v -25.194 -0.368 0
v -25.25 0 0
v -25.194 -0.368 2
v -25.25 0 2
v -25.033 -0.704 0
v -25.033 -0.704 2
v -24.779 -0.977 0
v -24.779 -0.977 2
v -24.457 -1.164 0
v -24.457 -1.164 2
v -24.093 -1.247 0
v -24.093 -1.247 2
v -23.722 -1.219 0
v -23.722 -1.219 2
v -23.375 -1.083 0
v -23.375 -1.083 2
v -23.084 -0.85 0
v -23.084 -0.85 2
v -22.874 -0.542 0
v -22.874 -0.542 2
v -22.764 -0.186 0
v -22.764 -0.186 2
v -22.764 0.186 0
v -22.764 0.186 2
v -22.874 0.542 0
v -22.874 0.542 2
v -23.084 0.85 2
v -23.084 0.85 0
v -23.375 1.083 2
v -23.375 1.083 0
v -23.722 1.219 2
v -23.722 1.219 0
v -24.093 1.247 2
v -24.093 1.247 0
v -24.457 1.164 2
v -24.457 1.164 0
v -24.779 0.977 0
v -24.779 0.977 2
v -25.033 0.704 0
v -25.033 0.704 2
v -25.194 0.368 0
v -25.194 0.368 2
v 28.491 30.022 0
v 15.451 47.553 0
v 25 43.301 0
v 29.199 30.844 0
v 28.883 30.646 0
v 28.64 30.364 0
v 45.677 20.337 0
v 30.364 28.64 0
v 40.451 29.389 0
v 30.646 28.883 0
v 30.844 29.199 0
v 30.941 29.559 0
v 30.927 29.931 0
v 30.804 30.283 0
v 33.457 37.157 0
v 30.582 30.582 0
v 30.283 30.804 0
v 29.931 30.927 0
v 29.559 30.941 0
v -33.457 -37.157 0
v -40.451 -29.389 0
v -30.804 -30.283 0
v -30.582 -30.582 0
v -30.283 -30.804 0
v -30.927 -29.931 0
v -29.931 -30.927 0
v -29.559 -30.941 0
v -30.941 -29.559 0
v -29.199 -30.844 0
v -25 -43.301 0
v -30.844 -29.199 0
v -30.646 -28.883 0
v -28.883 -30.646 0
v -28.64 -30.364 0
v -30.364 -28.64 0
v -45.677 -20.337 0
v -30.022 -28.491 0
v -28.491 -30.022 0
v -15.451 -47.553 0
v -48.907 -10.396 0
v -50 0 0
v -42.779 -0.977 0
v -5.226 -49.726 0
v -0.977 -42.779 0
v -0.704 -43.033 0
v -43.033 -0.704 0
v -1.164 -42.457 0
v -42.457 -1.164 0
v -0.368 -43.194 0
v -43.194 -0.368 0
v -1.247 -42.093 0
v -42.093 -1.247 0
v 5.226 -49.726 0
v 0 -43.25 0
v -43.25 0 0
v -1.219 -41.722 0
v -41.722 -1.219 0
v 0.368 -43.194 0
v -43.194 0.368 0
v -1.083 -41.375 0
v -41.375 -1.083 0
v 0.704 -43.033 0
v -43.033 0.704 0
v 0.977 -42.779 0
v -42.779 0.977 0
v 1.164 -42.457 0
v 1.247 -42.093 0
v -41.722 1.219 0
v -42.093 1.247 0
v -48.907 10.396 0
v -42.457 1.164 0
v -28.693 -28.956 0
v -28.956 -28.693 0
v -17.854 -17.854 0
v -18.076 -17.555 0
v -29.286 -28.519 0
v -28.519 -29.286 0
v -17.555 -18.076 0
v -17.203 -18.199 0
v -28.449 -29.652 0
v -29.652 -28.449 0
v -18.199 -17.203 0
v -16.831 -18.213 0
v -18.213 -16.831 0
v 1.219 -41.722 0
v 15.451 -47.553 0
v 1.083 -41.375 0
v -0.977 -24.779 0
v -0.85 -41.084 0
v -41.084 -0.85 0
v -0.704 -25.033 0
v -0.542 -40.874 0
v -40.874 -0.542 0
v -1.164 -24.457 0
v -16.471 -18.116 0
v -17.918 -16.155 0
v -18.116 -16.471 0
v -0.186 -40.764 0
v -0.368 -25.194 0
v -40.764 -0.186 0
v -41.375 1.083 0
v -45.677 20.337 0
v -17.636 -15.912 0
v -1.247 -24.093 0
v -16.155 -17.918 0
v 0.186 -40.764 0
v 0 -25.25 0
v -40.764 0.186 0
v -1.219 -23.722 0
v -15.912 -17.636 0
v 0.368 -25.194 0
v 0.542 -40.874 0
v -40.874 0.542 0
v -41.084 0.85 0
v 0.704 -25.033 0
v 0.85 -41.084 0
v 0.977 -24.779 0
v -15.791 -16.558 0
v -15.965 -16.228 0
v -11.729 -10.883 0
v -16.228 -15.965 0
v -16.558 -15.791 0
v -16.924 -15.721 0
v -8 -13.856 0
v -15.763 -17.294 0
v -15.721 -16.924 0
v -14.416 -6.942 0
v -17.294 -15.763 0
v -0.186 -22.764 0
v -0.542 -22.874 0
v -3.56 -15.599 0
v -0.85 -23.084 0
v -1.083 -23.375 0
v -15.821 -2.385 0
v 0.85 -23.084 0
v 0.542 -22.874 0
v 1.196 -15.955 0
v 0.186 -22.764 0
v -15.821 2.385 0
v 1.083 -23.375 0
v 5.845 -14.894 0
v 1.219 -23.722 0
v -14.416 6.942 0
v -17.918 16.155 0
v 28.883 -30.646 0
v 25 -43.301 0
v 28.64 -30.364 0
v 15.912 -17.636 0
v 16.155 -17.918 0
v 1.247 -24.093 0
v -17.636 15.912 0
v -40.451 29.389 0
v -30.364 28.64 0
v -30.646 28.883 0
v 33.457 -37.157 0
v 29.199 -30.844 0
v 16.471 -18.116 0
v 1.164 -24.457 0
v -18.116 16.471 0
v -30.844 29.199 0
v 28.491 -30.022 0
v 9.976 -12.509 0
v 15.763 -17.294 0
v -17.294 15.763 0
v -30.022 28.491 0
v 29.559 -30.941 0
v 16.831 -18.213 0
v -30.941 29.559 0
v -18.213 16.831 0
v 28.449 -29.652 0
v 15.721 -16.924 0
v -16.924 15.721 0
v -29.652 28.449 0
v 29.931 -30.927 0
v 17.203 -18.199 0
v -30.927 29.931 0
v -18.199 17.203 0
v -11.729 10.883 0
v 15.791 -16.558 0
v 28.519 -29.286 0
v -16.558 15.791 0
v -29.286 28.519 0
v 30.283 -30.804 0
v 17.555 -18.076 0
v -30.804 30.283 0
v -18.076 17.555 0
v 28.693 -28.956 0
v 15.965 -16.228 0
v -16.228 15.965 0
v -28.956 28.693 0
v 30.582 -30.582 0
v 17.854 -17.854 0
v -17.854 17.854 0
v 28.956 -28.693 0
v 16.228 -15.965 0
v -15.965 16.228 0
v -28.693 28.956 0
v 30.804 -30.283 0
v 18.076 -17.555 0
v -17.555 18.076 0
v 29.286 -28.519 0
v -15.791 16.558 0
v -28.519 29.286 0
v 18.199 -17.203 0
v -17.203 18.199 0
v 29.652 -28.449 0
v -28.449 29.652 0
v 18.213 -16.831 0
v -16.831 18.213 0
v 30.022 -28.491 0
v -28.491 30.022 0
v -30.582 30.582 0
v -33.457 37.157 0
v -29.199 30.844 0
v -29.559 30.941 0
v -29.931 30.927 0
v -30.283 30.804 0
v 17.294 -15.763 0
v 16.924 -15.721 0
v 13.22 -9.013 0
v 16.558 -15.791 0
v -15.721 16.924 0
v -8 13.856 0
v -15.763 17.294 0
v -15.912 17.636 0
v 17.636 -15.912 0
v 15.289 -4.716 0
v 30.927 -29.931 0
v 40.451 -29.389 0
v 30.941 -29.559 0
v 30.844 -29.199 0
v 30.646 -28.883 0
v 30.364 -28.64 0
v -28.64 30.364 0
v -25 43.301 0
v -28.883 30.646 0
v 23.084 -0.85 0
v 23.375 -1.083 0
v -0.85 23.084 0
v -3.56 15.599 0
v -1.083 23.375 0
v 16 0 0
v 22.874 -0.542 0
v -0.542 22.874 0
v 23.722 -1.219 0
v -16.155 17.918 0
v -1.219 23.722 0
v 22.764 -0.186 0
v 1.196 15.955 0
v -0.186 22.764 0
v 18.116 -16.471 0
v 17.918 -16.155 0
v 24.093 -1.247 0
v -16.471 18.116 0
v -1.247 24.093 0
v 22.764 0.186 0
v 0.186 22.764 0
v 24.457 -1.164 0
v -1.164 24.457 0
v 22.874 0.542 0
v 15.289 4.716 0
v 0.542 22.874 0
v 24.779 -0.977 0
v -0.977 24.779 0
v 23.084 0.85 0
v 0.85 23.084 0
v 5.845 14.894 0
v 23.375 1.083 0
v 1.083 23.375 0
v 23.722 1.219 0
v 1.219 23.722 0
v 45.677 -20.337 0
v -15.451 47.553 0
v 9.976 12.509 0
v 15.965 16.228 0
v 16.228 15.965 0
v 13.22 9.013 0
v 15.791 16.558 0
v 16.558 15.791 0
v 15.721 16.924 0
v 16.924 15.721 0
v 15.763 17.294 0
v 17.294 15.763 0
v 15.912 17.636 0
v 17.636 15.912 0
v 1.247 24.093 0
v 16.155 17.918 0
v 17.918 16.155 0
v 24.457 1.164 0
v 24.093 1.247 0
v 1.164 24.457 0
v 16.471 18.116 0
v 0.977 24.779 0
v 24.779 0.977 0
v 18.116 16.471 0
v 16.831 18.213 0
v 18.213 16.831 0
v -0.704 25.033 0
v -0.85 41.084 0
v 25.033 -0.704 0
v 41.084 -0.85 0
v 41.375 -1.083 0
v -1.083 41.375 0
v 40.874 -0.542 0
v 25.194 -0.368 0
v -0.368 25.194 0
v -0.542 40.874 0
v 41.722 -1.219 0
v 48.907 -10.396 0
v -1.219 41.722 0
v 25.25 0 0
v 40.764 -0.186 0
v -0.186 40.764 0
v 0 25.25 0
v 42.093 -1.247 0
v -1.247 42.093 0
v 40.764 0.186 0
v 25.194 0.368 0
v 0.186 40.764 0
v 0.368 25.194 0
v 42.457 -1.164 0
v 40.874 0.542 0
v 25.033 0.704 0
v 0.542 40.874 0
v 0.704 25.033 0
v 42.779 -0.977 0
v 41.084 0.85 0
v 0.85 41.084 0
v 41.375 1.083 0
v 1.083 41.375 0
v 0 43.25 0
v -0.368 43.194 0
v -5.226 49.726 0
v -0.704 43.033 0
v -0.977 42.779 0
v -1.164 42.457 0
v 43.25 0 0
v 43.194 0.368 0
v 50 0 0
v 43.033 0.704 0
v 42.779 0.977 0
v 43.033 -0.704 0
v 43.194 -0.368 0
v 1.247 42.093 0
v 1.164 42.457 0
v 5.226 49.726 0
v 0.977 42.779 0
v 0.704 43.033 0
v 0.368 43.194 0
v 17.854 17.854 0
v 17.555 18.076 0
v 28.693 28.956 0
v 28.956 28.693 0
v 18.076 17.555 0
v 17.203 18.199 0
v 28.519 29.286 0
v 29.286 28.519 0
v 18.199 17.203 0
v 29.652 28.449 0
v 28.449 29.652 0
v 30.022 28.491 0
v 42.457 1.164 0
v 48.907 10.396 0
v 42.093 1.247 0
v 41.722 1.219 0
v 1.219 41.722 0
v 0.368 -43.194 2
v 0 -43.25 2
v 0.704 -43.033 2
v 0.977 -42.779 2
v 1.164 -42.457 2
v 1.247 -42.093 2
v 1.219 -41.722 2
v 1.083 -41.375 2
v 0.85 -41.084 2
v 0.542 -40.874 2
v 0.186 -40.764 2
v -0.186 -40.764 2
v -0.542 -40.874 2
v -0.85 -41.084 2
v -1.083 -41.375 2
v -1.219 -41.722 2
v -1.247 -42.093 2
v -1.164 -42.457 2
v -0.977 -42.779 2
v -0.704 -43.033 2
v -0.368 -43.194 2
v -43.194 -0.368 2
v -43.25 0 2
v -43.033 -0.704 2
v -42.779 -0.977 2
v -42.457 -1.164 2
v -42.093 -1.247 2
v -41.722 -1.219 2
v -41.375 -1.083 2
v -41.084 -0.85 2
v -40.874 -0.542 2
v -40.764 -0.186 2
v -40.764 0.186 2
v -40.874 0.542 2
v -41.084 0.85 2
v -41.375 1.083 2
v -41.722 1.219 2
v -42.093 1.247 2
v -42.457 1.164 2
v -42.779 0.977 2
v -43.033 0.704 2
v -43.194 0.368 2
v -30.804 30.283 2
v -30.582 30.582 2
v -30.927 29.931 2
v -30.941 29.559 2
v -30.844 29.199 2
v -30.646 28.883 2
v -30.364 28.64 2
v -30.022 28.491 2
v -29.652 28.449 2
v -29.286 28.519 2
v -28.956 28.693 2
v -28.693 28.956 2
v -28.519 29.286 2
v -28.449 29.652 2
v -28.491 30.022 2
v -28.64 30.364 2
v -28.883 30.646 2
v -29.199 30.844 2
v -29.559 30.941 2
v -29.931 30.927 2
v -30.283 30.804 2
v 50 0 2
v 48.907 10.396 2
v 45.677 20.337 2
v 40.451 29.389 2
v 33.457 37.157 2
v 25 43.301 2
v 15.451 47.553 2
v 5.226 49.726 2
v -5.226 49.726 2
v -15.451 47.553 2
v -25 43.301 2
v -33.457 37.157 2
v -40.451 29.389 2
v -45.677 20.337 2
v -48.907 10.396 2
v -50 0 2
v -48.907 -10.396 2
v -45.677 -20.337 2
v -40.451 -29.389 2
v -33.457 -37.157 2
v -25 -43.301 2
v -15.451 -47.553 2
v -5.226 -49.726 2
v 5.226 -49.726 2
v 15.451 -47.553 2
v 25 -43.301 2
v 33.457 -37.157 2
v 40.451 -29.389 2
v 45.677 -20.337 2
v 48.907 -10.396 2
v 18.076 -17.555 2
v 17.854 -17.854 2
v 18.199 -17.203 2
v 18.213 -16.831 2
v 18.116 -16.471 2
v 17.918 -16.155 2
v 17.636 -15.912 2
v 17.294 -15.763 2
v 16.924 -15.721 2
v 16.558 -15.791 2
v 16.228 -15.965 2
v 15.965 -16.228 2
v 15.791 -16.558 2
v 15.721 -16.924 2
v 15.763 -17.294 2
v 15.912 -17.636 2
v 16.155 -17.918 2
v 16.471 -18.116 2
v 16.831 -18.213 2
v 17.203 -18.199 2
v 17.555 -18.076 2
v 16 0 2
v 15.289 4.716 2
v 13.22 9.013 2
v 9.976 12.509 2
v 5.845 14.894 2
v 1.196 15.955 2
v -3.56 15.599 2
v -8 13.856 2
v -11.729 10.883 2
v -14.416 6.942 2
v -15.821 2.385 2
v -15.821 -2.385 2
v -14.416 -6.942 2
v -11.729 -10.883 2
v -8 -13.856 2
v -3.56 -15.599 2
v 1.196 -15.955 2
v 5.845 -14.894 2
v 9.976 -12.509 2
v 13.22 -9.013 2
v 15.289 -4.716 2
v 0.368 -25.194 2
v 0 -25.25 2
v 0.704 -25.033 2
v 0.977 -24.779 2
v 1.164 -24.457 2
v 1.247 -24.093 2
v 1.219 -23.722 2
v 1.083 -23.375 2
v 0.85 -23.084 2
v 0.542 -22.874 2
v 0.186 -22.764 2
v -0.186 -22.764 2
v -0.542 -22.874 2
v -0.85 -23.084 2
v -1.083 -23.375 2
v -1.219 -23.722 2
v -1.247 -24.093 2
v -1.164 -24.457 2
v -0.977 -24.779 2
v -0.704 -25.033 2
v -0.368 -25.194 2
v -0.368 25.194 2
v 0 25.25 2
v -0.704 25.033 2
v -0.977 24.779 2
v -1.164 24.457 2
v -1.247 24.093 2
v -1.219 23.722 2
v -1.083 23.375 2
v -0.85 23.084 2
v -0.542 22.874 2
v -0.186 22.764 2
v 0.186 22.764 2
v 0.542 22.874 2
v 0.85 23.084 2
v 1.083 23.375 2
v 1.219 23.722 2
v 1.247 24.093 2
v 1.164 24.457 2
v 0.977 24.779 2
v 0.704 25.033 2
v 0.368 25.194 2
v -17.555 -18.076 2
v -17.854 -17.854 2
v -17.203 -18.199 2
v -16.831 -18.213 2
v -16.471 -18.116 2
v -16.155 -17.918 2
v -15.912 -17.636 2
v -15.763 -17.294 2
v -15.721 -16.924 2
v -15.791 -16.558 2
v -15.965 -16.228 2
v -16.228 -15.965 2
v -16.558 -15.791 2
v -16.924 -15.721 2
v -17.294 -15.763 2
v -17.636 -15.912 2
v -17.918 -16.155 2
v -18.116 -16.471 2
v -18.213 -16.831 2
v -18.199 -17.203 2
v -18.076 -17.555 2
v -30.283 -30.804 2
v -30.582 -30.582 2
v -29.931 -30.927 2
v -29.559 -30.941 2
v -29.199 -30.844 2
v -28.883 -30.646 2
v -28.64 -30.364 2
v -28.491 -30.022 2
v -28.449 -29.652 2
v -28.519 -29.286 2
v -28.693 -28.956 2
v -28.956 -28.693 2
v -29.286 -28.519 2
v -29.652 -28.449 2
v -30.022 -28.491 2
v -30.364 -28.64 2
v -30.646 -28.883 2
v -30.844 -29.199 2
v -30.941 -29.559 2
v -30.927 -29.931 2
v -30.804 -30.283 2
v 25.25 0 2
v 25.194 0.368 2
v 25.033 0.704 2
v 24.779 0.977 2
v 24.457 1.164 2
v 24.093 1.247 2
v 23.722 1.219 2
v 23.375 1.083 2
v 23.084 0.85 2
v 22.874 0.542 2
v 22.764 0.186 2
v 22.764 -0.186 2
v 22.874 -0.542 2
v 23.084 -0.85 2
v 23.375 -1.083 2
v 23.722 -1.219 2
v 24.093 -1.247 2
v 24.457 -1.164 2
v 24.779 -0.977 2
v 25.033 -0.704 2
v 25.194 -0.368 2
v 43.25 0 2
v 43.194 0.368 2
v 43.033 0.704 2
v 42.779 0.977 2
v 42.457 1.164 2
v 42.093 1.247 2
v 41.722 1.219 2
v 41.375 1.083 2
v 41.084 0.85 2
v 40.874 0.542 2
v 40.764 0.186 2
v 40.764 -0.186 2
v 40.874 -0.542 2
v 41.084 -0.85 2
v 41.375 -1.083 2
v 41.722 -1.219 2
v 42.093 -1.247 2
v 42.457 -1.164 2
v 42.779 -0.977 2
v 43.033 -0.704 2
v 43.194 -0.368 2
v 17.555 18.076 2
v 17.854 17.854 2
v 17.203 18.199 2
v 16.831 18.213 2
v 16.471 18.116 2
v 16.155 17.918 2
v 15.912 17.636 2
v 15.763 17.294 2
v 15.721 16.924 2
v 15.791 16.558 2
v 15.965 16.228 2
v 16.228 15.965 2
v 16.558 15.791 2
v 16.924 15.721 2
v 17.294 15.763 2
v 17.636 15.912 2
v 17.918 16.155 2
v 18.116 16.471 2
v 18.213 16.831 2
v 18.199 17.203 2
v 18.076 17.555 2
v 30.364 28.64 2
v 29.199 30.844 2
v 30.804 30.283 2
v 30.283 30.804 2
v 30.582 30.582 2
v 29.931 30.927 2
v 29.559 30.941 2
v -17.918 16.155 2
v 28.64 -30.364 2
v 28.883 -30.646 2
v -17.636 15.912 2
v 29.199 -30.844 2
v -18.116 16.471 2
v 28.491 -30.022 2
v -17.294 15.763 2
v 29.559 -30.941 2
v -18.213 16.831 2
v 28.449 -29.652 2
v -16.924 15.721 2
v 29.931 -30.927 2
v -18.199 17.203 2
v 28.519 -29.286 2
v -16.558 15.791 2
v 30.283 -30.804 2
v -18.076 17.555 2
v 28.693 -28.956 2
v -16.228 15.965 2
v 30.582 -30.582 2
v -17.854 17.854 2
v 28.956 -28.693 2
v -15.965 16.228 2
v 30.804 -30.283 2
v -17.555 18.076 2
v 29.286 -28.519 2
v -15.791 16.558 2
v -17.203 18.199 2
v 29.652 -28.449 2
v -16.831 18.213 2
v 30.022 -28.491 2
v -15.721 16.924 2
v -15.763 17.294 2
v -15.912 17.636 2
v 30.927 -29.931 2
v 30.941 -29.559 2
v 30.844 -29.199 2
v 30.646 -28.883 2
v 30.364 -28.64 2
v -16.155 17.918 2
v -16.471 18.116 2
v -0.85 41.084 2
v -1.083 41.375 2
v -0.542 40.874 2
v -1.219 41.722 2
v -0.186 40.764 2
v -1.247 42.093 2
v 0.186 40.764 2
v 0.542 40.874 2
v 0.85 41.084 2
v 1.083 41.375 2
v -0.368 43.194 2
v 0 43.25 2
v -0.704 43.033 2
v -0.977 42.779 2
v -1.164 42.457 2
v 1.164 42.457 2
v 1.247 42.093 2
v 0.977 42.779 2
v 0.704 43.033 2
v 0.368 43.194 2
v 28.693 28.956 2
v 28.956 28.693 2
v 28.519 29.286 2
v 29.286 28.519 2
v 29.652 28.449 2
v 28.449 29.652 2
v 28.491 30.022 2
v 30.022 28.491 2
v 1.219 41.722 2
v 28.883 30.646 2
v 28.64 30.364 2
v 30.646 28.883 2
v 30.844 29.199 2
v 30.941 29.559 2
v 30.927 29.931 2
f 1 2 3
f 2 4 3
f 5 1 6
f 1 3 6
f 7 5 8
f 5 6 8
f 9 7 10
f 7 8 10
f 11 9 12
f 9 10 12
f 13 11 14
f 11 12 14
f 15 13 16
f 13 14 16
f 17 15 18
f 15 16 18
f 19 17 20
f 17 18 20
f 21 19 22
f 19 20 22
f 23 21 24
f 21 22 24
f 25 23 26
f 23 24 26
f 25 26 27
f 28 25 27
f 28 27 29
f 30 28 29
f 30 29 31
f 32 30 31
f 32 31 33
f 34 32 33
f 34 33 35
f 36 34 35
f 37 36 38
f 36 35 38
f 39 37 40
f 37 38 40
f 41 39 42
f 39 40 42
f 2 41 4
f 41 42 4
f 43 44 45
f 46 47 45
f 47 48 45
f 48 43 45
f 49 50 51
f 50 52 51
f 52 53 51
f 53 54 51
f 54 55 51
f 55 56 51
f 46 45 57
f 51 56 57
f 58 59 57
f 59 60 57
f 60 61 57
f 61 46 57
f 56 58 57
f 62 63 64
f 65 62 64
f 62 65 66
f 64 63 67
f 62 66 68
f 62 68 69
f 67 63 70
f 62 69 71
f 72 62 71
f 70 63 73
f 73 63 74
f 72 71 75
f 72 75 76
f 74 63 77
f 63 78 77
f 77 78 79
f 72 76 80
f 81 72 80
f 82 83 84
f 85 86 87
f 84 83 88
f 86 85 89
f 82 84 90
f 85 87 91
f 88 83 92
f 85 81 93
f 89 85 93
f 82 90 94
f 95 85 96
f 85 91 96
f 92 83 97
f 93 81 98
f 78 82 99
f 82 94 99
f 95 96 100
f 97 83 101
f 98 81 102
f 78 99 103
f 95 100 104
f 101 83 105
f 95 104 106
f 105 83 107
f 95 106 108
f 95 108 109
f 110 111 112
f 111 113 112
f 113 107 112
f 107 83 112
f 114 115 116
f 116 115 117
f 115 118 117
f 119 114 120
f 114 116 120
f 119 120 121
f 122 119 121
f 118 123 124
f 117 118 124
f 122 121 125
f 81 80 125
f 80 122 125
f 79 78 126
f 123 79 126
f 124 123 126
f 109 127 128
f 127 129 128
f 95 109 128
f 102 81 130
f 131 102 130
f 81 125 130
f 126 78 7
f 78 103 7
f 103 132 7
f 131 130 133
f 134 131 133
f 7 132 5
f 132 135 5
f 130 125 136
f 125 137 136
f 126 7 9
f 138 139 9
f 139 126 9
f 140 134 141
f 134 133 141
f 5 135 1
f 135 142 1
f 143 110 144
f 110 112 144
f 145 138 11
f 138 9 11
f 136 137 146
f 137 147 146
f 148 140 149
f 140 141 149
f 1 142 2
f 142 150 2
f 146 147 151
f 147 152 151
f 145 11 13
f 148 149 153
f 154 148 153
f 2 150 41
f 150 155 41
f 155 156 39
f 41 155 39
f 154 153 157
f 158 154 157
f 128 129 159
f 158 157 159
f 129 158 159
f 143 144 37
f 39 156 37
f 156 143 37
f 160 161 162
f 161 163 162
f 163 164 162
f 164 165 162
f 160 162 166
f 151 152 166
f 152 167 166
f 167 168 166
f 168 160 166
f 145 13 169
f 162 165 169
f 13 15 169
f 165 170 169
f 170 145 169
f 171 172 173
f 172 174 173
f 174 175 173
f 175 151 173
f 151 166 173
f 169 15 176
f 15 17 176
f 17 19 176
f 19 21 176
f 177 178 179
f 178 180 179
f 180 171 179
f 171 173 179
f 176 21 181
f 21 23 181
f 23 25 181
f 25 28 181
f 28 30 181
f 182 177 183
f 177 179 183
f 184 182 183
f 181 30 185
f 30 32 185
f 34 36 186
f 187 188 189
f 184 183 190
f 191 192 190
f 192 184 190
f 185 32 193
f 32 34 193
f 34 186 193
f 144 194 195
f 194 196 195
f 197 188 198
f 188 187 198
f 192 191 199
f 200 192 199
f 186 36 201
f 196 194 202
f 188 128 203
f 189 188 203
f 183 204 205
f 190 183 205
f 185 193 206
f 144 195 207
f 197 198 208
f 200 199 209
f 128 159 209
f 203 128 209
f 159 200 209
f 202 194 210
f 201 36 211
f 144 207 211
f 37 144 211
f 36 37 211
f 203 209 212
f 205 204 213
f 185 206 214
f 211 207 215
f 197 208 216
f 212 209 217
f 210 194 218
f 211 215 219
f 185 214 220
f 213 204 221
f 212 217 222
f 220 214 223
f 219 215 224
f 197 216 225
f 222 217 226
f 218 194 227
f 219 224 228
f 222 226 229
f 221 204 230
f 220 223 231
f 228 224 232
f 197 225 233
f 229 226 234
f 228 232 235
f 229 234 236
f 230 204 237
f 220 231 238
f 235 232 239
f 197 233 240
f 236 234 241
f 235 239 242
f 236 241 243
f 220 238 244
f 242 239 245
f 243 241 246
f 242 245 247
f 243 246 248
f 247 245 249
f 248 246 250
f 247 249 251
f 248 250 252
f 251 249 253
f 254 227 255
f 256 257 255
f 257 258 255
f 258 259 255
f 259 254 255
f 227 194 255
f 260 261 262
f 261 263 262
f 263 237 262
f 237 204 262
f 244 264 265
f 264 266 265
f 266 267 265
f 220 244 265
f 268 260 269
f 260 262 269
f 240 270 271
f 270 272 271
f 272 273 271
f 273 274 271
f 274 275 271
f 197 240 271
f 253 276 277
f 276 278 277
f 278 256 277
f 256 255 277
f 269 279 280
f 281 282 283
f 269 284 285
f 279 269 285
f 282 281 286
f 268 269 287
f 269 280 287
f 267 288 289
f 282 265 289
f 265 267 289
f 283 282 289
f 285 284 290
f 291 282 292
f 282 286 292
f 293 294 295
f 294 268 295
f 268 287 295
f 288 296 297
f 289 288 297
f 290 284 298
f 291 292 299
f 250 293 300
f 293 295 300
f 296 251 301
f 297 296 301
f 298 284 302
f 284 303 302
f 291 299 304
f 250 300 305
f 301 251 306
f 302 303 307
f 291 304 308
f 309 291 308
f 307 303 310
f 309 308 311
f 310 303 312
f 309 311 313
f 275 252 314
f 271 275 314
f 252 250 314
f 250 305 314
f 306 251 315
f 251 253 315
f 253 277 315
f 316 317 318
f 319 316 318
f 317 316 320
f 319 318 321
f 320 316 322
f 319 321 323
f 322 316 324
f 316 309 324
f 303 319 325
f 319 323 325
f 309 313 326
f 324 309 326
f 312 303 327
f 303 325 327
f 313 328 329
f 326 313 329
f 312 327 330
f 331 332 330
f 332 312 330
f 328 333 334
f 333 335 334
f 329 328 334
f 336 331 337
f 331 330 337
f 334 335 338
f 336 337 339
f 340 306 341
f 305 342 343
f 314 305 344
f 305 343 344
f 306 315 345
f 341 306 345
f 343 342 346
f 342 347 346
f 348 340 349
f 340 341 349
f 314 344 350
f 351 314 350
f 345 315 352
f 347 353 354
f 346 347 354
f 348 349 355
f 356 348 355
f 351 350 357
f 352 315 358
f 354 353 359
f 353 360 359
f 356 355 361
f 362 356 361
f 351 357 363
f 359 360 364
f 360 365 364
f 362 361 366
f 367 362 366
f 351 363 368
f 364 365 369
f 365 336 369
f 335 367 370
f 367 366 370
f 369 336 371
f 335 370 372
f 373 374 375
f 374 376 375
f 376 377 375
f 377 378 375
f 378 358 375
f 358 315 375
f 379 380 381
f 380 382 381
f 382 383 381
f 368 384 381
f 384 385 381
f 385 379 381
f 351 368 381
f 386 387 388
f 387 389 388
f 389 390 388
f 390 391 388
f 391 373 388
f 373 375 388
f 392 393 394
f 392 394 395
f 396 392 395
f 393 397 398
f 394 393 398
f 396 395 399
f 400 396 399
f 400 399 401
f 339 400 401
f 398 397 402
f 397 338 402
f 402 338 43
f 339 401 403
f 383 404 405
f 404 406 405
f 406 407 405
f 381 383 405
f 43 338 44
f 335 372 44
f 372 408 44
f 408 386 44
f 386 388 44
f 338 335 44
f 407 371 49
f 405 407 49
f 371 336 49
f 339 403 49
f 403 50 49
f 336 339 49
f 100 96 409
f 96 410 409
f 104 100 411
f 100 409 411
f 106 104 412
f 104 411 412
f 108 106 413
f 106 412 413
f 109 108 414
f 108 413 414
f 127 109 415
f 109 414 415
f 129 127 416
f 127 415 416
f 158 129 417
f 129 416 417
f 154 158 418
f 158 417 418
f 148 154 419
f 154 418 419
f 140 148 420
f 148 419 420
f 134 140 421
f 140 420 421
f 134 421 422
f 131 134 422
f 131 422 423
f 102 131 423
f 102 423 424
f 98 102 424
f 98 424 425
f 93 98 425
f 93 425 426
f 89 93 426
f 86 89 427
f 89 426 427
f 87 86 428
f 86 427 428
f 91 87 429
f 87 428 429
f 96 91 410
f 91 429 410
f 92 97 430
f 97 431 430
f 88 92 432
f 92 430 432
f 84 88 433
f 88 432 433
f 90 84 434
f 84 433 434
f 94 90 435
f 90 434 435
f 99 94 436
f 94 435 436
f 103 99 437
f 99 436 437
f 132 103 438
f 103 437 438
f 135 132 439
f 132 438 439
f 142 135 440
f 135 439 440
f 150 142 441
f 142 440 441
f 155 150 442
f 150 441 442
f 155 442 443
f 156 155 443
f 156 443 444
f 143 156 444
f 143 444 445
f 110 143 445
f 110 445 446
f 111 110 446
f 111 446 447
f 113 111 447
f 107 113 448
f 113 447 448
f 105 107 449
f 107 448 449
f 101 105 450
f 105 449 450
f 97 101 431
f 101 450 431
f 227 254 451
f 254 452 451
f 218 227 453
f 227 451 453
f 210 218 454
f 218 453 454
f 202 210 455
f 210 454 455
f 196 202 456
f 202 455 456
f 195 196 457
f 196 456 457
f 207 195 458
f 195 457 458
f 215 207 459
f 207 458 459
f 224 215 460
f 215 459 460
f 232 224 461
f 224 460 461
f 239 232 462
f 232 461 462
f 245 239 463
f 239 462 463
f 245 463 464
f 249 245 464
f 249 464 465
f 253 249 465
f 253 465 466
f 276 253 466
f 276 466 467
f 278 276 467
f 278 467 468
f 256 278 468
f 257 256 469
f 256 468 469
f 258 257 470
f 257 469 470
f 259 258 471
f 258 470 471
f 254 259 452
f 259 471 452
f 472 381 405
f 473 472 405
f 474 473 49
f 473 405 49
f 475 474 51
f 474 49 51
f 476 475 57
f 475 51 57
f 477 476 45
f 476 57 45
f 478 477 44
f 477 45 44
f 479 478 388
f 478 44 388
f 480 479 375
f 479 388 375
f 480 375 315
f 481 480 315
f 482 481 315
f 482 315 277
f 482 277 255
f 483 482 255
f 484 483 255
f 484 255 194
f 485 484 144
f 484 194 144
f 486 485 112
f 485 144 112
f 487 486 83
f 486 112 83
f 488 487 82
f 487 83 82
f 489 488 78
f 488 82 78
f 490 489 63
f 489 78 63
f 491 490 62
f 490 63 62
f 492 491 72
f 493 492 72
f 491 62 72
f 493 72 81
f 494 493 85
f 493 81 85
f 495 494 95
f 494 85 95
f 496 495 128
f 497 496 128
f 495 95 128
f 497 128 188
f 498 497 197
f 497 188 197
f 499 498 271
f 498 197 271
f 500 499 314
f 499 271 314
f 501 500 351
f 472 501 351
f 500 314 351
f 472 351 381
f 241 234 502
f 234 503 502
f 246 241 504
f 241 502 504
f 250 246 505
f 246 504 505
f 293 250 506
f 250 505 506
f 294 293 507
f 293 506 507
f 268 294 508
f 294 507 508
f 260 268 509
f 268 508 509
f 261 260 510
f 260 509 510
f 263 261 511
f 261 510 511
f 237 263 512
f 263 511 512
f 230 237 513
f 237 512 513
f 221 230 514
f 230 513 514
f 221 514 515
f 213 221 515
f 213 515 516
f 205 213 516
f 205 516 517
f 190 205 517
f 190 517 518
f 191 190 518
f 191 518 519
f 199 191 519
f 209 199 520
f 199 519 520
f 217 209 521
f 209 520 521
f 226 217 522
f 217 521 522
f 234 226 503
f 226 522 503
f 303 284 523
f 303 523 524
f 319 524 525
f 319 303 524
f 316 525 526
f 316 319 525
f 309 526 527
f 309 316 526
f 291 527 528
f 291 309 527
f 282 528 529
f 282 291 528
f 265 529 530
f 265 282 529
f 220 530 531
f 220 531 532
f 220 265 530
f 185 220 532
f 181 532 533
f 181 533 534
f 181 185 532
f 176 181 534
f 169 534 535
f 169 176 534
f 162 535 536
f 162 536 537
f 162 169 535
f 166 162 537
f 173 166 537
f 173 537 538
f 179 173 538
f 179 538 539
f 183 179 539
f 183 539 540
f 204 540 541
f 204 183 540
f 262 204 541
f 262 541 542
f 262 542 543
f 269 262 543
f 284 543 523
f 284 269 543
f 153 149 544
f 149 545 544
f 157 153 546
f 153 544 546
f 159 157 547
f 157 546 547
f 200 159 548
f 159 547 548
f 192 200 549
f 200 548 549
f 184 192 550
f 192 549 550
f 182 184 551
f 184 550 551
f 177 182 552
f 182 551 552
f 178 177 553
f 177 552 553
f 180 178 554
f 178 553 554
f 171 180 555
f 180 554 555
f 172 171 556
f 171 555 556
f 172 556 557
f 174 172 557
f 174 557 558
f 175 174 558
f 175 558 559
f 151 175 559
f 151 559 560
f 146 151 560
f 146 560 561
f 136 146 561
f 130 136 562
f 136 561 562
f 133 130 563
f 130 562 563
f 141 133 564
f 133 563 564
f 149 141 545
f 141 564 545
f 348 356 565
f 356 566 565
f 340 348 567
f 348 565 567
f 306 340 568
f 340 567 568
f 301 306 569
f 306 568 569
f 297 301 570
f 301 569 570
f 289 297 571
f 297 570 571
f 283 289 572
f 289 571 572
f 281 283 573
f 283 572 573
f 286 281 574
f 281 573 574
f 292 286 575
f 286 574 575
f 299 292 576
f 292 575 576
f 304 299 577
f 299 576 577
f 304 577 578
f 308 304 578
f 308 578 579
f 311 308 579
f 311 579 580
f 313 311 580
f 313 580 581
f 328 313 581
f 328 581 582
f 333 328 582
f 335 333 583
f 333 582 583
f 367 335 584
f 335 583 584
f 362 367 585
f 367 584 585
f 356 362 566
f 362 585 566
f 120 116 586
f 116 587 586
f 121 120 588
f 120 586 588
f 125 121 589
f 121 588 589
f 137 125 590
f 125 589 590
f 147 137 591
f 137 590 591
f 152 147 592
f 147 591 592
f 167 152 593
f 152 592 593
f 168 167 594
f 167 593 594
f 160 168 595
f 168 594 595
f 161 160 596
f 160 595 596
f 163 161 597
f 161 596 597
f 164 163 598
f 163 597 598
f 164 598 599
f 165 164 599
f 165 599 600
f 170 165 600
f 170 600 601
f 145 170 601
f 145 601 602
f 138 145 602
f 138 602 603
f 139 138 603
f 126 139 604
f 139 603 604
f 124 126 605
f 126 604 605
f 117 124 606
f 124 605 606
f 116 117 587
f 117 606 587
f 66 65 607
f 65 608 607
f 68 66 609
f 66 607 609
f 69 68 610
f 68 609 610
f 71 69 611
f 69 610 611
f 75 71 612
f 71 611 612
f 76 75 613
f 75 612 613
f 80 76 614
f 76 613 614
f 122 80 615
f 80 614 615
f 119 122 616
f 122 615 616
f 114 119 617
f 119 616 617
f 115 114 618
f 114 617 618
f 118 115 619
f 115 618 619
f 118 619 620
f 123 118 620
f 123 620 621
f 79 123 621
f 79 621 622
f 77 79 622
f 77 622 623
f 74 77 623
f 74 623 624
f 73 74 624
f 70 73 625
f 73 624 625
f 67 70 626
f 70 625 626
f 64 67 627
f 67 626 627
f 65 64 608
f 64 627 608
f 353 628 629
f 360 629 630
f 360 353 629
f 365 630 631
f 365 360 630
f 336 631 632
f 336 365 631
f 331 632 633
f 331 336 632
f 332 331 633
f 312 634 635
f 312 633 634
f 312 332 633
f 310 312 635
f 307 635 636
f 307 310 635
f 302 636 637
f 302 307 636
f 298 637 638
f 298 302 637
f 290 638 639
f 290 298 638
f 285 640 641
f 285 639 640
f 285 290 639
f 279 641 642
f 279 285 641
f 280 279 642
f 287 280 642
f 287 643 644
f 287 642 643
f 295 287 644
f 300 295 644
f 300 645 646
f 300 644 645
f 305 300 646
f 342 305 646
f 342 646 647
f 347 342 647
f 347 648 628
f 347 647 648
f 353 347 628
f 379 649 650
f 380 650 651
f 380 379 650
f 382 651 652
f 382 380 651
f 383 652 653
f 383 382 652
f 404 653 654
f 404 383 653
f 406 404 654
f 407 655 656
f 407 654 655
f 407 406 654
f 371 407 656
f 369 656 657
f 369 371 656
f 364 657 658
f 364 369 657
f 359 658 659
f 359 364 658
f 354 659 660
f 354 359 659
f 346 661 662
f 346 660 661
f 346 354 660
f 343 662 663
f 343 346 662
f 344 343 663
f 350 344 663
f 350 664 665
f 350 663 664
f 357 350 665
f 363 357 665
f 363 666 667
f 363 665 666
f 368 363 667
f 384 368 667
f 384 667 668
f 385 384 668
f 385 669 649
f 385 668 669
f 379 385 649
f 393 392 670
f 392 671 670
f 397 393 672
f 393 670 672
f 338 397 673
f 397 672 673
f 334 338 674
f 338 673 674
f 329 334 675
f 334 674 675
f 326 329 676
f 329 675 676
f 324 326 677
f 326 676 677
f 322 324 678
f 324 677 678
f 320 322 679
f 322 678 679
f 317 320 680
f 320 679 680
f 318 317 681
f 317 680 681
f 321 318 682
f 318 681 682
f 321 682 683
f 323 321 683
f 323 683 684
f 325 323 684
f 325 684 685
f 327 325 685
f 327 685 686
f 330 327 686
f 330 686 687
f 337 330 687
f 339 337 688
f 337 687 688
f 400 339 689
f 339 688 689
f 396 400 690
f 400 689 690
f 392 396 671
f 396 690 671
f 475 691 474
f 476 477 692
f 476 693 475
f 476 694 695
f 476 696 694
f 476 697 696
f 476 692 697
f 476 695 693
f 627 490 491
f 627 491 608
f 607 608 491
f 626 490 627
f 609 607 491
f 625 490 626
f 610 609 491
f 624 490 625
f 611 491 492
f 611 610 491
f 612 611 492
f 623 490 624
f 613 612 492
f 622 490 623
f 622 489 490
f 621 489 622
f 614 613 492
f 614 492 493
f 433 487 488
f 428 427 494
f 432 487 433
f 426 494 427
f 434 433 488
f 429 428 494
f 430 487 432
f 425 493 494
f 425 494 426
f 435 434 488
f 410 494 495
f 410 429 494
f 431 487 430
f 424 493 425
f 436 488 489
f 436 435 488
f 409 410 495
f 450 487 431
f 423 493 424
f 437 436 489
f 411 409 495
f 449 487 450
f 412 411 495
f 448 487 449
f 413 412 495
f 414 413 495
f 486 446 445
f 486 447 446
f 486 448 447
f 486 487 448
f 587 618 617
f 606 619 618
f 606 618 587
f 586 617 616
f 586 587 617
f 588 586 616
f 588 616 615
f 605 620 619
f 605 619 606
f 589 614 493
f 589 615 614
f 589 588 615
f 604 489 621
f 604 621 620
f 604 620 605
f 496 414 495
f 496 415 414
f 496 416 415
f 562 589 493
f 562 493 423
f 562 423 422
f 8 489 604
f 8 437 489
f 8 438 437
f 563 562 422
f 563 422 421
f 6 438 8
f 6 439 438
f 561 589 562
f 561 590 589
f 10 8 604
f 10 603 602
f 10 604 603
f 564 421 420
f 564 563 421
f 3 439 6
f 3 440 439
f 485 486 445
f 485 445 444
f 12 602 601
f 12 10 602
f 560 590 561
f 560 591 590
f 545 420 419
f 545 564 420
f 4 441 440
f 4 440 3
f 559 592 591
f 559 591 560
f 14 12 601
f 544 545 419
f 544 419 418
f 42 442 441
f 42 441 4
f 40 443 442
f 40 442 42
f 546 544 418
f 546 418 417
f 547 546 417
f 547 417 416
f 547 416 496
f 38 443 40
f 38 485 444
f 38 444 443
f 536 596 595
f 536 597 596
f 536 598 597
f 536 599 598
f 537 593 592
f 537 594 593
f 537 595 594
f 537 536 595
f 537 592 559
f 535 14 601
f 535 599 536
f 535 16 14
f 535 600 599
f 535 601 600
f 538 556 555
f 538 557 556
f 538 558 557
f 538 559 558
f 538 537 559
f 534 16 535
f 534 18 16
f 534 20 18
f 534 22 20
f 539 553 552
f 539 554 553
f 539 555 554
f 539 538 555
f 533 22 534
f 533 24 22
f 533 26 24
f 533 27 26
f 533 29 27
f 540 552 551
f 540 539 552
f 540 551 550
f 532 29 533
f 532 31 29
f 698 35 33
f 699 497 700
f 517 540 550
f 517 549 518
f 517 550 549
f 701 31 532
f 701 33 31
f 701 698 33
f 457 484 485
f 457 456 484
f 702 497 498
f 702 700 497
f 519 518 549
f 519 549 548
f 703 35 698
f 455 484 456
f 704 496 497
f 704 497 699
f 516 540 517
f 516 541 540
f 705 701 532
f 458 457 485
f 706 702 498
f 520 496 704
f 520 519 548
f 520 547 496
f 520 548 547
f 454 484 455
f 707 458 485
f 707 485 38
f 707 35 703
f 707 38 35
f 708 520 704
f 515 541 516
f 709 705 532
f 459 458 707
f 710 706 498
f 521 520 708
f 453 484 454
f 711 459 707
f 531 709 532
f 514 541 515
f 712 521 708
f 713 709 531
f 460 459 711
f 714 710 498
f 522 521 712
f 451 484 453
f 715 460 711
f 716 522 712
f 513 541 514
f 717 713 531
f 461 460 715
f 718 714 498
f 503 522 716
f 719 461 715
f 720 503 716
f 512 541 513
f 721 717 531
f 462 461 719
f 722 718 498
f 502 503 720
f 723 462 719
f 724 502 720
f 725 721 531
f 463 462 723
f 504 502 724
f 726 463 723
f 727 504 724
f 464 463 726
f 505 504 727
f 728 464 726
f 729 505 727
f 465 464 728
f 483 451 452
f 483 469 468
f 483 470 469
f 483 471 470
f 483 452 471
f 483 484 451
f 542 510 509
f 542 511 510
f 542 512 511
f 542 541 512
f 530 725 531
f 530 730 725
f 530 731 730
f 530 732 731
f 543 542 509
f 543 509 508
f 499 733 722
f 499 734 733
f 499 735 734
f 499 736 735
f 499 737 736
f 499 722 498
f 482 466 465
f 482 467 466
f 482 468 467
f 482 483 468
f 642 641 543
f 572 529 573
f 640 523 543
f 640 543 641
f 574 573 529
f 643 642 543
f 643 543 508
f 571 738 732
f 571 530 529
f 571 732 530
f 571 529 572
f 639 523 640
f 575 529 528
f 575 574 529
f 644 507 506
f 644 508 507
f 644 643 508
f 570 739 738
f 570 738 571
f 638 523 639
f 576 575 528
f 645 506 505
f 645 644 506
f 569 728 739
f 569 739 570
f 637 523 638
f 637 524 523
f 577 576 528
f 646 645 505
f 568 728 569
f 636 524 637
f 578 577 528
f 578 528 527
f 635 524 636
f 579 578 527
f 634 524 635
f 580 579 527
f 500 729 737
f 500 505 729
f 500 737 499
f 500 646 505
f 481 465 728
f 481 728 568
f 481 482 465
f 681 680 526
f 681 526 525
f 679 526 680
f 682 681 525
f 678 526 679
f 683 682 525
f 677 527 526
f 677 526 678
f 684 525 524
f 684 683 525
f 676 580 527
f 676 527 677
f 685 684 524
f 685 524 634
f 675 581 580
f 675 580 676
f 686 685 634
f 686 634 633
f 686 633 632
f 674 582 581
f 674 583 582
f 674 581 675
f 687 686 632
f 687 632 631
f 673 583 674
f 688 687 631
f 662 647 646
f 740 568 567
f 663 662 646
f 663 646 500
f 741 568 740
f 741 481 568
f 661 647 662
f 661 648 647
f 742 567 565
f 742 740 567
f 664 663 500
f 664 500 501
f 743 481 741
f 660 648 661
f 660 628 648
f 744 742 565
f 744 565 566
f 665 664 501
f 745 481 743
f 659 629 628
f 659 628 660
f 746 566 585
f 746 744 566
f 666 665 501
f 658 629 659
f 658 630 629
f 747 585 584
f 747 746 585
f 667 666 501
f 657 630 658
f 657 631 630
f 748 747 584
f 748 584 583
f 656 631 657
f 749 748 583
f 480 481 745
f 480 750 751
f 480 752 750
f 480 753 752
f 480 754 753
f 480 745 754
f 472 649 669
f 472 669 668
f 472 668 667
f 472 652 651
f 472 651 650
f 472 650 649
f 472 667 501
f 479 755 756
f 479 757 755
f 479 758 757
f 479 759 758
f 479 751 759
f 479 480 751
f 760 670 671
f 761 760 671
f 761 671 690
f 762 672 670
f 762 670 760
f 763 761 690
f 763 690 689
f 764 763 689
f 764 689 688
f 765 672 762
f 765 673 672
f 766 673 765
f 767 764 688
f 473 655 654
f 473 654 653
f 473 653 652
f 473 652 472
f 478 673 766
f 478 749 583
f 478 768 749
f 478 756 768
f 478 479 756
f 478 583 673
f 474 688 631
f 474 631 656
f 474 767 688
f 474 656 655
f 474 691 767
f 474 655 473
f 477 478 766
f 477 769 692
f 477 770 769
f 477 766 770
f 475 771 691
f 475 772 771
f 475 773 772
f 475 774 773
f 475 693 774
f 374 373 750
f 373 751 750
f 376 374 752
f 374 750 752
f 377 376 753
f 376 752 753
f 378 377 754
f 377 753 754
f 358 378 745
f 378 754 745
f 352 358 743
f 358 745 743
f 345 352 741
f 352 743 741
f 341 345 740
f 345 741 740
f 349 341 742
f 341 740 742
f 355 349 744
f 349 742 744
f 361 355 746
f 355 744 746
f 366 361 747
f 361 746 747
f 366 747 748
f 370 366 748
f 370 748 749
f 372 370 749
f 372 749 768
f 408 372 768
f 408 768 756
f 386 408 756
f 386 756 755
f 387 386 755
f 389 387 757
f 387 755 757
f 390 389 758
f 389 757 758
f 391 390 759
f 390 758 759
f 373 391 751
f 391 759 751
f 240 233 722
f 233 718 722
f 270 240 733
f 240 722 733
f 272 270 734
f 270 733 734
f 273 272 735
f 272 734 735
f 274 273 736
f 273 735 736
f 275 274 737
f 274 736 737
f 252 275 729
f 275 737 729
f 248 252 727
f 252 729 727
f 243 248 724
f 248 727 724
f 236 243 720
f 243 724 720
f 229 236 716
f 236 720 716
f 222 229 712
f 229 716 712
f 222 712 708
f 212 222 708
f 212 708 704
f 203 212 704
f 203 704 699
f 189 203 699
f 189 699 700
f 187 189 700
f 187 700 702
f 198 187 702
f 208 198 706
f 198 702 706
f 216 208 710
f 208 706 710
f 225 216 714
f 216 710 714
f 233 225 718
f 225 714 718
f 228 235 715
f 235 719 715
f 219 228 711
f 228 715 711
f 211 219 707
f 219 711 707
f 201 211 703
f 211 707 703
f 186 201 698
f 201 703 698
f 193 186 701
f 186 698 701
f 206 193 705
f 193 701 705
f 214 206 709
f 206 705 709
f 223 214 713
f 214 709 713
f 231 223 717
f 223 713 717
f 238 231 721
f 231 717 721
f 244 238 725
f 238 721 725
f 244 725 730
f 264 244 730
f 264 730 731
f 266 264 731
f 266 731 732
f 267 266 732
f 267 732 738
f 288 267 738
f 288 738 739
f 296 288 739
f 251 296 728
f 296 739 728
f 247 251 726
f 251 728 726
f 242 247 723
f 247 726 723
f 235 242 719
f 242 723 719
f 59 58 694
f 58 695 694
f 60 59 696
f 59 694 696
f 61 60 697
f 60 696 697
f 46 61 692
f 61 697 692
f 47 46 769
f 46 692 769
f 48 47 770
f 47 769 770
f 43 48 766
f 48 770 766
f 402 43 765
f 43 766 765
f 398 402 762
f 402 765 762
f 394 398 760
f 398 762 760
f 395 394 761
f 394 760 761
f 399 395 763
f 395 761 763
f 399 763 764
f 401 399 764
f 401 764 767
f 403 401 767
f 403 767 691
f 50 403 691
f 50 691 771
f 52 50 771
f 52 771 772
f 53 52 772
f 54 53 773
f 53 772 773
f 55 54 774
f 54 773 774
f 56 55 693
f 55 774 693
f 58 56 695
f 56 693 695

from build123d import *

# Parameters (mm, degrees)
SKETCH_R           = 50
SKETCH_R_2         = 16
PAD_DEPTH          = 2
SKETCH001_R        = 1.25
POCKET_DEPTH       = 282.871995
POCKET_DEPTH_BACK  = 284.871995
POLARPATTERN_COUNT = 8


with BuildPart() as part:
    # Sketch → Pad (new body)
    with BuildSketch(Plane.XY):
        Circle(SKETCH_R)
        Circle(SKETCH_R_2, mode=Mode.SUBTRACT)
    extrude(amount=PAD_DEPTH)

    # Sketch001 → Pocket (cut, two sides)
    with BuildSketch(Plane.XY) as pocket_sk:
        with Locations((24, 0)):
            Circle(SKETCH001_R)
        with Locations((42, 0)):
            Circle(SKETCH001_R)
    pocket = extrude(amount=-POCKET_DEPTH, mode=Mode.SUBTRACT) + extrude(pocket_sk.sketch, amount=POCKET_DEPTH_BACK, mode=Mode.SUBTRACT)

    # PolarPattern: Pocket ×8 about axis
    polarpattern_axis = Axis((0, 0, 0), (0, 0, 1))
    for i in range(1, POLARPATTERN_COUNT):
        add(pocket.rotate(polarpattern_axis, i * 360 / POLARPATTERN_COUNT), mode=Mode.SUBTRACT)


solid = part.part
